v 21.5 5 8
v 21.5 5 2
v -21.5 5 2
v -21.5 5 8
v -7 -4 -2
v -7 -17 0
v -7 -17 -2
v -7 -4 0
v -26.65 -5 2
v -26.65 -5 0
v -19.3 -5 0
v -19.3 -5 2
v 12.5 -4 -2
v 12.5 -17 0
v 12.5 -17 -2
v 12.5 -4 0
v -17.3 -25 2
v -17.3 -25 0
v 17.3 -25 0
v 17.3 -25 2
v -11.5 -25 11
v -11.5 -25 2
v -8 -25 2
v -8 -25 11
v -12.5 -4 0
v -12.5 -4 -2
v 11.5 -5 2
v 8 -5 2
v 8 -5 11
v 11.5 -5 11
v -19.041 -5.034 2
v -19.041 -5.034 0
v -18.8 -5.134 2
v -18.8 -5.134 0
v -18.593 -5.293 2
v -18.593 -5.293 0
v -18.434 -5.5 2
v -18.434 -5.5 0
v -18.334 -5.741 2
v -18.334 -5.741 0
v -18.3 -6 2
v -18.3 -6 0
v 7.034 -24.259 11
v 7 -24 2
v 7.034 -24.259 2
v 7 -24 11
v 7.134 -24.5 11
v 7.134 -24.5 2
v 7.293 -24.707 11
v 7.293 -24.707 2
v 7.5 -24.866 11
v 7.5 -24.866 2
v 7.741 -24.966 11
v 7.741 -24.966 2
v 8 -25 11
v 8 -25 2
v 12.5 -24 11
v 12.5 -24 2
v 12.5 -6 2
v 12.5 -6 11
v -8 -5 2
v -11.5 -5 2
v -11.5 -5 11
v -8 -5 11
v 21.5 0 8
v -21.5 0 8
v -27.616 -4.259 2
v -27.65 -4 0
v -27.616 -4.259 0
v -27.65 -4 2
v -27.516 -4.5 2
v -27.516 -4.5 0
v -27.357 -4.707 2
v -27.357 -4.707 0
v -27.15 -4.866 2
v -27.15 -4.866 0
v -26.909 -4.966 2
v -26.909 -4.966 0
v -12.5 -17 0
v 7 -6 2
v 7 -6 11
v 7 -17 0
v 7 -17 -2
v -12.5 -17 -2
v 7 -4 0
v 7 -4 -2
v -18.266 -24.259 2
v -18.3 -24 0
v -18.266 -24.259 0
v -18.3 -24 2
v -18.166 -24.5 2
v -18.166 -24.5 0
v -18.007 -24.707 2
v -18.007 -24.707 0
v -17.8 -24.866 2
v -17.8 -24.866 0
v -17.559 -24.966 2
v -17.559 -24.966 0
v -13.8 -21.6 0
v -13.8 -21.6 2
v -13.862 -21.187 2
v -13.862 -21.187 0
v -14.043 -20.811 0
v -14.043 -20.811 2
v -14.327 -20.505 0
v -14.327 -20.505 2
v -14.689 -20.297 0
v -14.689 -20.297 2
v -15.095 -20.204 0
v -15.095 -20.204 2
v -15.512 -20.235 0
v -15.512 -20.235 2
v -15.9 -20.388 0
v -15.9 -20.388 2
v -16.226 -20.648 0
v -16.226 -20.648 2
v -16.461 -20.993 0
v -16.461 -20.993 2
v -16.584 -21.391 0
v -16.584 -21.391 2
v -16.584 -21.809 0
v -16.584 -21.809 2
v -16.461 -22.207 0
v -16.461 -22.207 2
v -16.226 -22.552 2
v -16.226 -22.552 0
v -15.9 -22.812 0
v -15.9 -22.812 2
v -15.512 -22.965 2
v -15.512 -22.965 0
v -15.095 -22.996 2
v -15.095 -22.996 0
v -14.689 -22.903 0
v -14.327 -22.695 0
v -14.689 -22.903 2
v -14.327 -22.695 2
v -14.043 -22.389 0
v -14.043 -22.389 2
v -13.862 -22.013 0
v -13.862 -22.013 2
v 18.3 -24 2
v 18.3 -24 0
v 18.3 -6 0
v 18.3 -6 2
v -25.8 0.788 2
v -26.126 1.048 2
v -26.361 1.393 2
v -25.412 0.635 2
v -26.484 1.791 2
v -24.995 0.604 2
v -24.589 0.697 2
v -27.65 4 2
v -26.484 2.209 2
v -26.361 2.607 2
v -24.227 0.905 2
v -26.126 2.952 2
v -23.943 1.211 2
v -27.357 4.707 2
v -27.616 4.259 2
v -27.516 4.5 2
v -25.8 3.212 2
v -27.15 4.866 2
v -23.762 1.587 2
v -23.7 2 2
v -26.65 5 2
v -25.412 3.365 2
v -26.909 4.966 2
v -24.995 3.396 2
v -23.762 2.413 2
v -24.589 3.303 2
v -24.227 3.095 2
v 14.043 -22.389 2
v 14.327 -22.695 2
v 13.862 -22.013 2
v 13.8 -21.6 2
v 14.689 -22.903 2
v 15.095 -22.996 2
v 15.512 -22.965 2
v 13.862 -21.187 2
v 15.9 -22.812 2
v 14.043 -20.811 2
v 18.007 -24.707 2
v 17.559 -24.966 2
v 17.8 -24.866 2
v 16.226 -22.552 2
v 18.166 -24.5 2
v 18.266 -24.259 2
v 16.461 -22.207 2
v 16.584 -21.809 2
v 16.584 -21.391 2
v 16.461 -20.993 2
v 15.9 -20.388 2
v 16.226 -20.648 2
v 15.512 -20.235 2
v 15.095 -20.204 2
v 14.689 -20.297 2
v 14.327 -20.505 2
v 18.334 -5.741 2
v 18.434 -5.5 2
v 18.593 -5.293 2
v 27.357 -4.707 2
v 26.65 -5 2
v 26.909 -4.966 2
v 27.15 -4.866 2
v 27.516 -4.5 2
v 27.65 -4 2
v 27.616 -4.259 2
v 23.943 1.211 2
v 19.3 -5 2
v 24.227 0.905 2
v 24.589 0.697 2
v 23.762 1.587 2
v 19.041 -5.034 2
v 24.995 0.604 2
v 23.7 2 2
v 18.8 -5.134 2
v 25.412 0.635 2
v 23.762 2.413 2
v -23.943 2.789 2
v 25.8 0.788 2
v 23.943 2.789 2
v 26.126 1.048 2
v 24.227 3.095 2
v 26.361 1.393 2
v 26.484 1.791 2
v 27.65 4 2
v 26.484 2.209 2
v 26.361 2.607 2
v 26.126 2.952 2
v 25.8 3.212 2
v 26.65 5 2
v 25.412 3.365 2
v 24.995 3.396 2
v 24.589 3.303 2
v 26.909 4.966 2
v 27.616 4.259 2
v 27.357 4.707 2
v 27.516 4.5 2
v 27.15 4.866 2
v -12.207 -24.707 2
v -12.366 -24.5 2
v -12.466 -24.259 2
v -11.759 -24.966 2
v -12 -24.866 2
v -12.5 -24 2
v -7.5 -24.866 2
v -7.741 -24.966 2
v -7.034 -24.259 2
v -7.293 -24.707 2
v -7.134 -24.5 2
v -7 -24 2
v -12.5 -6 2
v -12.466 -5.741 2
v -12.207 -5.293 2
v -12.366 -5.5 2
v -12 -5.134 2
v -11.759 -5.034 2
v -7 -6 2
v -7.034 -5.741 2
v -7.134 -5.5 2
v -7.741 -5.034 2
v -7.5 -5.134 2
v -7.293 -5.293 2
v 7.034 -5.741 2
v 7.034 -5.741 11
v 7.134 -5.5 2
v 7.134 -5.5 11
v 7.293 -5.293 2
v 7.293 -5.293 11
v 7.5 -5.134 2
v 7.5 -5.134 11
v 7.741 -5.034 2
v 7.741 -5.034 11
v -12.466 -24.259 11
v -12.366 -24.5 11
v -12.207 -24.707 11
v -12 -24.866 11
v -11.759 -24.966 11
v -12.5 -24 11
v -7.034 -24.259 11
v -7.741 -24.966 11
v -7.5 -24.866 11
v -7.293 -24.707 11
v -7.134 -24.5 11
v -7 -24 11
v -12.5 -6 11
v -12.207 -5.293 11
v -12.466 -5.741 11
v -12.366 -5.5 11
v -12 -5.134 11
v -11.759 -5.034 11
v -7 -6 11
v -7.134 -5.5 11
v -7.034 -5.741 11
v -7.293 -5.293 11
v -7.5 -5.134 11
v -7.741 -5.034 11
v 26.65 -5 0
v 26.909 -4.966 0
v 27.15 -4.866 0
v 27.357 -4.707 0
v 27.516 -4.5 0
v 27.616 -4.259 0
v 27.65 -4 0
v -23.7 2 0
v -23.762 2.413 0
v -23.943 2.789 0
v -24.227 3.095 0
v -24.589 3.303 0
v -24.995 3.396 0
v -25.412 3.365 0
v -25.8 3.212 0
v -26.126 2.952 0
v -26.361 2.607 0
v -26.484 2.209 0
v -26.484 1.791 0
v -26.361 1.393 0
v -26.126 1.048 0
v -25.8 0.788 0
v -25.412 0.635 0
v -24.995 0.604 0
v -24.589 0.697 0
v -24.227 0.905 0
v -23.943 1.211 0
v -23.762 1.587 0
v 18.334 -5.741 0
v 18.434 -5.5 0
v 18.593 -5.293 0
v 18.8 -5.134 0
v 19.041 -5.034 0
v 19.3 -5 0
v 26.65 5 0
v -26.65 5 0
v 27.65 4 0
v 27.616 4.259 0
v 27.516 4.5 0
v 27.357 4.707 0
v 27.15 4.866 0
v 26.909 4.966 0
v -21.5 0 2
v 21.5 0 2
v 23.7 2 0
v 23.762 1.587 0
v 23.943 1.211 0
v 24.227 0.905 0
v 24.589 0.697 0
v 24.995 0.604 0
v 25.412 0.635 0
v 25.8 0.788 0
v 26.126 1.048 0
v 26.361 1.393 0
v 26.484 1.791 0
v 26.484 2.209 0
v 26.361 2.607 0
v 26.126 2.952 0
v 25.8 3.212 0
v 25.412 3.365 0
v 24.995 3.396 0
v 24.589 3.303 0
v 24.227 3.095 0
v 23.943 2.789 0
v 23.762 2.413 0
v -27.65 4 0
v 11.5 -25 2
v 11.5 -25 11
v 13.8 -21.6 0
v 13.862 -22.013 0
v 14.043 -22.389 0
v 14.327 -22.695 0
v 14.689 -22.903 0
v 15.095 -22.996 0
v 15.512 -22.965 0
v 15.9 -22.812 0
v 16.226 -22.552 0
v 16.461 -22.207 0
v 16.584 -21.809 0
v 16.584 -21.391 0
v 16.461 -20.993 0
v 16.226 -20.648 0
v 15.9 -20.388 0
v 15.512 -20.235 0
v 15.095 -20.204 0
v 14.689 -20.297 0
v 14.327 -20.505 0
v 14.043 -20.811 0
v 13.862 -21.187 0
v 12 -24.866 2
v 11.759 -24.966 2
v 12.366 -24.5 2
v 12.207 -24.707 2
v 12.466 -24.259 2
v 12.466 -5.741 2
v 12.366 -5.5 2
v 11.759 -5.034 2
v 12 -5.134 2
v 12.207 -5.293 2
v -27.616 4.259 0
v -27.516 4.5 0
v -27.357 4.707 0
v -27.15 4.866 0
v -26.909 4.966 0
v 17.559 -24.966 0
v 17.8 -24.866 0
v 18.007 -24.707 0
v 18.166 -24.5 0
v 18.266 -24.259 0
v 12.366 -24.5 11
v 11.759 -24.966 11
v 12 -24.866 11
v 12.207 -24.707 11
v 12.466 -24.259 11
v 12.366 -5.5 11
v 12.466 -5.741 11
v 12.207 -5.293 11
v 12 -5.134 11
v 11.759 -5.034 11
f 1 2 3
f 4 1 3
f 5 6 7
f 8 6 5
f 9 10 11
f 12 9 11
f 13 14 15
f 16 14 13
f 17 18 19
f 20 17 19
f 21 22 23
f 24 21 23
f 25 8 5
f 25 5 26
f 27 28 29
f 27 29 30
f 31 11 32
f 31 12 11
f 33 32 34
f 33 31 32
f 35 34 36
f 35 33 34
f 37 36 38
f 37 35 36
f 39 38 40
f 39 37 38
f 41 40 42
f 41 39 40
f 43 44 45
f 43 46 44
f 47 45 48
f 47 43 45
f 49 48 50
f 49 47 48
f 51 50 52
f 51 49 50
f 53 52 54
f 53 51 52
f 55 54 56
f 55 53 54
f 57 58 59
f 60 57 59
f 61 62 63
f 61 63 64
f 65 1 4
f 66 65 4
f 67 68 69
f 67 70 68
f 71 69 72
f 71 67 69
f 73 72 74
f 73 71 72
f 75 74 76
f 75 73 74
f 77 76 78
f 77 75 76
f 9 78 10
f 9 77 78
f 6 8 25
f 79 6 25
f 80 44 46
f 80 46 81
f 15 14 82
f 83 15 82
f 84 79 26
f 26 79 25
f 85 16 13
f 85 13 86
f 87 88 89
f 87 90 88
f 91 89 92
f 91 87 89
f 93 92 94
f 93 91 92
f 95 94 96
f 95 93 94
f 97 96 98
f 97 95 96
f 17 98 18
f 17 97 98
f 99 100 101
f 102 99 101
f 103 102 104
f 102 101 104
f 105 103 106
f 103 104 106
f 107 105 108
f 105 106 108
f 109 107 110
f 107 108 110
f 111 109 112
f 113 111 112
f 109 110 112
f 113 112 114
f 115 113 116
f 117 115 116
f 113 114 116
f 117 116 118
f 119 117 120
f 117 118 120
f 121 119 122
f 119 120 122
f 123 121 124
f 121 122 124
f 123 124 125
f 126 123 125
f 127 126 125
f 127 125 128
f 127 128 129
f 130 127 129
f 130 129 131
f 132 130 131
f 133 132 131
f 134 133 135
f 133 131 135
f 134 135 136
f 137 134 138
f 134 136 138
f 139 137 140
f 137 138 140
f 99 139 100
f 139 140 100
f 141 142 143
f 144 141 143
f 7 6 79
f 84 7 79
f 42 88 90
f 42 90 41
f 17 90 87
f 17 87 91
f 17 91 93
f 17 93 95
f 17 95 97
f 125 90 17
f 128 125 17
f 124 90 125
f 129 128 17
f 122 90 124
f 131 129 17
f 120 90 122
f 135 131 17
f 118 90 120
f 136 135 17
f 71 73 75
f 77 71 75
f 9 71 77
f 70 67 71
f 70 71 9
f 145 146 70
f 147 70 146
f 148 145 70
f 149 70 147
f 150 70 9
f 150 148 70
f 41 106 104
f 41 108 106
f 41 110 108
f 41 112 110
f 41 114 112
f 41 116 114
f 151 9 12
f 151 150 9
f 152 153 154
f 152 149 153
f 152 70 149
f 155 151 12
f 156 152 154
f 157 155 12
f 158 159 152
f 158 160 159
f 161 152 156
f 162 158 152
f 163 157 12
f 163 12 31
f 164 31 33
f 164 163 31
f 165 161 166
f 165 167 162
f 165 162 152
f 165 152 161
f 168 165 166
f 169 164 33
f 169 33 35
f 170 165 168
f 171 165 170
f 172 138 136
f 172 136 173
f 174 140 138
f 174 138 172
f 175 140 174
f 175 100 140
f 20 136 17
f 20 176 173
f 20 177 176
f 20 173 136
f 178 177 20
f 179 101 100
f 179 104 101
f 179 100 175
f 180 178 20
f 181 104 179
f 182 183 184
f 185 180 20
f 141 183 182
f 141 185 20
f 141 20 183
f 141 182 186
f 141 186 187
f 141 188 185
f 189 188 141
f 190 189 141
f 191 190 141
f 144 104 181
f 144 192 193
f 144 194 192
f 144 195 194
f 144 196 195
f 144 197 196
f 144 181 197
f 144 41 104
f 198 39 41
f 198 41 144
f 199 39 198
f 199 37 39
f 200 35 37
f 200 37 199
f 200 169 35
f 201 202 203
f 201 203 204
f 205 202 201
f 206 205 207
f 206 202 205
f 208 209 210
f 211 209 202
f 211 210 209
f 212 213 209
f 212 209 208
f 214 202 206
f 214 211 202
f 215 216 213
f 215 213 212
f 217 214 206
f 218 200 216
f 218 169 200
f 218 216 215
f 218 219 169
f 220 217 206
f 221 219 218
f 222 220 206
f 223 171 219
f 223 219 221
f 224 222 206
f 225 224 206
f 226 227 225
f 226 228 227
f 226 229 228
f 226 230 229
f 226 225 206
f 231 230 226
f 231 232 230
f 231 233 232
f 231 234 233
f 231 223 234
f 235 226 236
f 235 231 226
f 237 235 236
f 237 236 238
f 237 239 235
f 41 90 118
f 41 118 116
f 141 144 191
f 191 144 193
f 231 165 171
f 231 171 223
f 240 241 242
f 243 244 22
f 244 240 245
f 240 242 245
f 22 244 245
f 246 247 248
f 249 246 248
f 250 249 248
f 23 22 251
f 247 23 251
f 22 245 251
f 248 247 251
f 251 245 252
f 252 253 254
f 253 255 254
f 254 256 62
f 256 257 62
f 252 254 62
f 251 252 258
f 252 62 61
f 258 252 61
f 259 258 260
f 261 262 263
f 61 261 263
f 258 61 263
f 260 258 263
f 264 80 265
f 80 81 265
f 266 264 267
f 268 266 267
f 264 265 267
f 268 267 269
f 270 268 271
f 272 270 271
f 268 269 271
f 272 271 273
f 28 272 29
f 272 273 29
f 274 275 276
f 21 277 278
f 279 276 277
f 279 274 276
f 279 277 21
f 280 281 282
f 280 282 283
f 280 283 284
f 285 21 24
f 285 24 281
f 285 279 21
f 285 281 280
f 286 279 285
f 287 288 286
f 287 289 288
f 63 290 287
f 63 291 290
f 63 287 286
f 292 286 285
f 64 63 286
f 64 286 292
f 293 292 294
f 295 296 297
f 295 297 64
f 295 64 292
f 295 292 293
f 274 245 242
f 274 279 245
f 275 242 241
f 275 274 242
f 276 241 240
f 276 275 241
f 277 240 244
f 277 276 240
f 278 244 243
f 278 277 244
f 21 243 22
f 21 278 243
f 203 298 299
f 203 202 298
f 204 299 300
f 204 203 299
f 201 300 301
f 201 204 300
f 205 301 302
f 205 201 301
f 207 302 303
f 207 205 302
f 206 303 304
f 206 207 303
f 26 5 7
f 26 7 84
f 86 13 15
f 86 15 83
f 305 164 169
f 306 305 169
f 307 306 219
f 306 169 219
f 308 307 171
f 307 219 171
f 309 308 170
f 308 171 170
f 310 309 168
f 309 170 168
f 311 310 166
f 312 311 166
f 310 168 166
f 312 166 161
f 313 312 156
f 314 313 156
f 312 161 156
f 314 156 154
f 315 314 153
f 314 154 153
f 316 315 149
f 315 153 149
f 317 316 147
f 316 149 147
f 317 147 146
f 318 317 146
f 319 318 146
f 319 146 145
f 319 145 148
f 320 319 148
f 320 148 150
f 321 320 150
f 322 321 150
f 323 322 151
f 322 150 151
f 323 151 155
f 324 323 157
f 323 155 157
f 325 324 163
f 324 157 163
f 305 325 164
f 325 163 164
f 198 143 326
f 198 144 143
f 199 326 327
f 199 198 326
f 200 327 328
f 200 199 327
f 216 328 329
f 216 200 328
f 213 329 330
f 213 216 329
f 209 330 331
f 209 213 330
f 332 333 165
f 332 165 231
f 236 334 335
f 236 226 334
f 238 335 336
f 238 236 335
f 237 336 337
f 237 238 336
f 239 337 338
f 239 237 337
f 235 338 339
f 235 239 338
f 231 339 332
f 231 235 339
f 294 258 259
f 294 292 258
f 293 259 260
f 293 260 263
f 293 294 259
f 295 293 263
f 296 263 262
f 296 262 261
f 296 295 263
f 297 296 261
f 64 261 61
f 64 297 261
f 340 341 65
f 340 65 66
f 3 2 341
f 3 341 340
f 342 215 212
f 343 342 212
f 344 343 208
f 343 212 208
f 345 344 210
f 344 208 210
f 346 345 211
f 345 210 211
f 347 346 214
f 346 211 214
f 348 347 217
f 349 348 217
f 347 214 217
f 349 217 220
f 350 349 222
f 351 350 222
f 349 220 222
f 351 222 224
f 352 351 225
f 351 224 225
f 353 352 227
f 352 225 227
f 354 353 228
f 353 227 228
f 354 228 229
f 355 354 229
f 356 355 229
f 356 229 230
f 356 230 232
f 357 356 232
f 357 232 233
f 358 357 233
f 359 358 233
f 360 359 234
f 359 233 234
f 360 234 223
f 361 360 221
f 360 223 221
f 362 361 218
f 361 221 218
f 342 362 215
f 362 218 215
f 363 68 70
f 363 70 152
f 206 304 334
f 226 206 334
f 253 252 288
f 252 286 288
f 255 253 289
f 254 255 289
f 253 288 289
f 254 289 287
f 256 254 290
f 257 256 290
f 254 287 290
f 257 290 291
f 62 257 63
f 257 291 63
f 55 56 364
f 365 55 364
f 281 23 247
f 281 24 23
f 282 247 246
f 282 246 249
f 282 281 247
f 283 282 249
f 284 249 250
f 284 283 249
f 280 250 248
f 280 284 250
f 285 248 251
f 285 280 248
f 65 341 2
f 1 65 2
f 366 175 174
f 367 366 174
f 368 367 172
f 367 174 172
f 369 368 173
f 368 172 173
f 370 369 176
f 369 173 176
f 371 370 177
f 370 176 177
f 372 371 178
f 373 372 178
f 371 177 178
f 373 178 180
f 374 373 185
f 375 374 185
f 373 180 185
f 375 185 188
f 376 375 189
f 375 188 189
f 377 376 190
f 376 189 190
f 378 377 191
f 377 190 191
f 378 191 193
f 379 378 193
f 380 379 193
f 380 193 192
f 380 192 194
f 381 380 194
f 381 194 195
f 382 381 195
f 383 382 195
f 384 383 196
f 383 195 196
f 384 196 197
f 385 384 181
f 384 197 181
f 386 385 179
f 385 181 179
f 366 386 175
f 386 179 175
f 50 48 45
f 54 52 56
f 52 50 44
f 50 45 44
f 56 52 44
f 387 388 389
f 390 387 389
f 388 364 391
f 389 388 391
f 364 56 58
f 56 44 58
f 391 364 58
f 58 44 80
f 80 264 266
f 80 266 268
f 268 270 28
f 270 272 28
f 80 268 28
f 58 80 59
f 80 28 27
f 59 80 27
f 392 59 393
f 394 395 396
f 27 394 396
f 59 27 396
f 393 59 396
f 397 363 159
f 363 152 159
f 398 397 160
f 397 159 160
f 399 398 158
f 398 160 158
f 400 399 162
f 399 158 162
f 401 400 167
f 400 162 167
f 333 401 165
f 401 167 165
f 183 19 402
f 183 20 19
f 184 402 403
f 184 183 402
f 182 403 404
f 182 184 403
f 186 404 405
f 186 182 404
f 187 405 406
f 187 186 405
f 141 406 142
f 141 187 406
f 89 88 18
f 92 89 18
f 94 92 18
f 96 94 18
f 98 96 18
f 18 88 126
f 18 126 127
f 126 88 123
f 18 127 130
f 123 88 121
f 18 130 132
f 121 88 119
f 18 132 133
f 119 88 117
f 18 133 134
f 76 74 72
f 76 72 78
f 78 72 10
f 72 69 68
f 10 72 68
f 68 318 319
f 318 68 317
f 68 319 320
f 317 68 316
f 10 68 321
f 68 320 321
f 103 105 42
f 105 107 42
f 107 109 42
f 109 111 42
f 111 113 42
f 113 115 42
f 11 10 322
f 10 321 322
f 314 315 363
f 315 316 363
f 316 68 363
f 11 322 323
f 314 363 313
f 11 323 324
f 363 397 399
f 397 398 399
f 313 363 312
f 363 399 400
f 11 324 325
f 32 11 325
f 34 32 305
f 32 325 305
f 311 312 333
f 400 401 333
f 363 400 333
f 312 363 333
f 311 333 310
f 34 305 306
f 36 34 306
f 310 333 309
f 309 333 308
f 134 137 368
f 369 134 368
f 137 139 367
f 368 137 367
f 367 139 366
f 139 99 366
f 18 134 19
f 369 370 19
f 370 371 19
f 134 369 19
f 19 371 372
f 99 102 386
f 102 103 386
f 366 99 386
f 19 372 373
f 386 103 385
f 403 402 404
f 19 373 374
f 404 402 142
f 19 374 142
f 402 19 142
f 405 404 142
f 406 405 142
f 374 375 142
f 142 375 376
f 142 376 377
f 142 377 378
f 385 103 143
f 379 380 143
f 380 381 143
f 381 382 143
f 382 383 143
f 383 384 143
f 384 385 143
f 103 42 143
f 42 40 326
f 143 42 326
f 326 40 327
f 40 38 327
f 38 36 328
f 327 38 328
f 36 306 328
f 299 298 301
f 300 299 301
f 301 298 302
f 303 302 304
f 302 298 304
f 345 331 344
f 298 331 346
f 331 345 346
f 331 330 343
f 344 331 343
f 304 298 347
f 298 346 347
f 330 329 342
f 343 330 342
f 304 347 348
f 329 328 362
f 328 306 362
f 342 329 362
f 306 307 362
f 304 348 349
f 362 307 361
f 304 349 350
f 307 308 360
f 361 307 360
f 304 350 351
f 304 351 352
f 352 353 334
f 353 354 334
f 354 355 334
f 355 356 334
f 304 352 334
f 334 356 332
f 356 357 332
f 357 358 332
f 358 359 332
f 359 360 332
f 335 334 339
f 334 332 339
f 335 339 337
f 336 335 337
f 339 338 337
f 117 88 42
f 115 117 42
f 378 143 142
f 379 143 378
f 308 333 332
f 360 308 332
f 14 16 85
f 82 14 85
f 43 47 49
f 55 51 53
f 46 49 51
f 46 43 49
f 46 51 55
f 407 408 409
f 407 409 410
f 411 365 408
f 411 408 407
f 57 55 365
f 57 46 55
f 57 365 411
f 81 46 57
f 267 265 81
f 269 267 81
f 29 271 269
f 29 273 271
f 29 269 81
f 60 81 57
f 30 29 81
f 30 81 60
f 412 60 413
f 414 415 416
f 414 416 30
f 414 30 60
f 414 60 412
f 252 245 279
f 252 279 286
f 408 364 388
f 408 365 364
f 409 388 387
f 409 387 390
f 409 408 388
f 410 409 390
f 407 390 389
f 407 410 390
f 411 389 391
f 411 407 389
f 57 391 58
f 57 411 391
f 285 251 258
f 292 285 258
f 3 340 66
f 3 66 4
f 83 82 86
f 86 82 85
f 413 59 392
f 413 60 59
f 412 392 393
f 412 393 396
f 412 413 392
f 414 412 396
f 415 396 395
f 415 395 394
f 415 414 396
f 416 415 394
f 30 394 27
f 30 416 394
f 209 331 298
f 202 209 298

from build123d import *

# Parameters (mm, degrees)
SKETCH_1_W          = 55.3
SKETCH_1_H          = 10
SKETCH_1_W_2        = 36.6
SKETCH_1_H_2        = 20
EXTRUDE_1_DEPTH     = 2
FILLET_1_R          = 1
SKETCH_2_R          = 1.4
CUT_EXTRUDE_1_DEPTH = 2
SKETCH_3_W          = 5.5
SKETCH_3_H          = 20
EXTRUDE_2_DEPTH     = 9
EXTRUDE_2_2_DEPTH   = 9
FILLET_2_R          = 1
FILLET_3_R          = 1
SKETCH_4_W          = 5.5
SKETCH_4_H          = 13
EXTRUDE_3_DEPTH     = 2
EXTRUDE_3_2_DEPTH   = 2
SKETCH_5_W          = 43
SKETCH_5_H          = 5
EXTRUDE_4_DEPTH     = 6


with BuildPart() as part:
    # 草图1 → 凸台-拉伸1 (new body)
    with BuildSketch(Plane.XY):
        Rectangle(SKETCH_1_W, SKETCH_1_H)
        with Locations((0, -15)):
            Rectangle(SKETCH_1_W_2, SKETCH_1_H_2)
    extrude(amount=EXTRUDE_1_DEPTH)

    # 圆角1
    fillet_1_edges = [part.edges().sort_by_distance(p)[0] for p in [
        (27.65, -5, 1),
        (18.3, -5, 1),
        (18.3, -25, 1),
        (-18.3, -25, 1),
        (-18.3, -5, 1),
        (-27.65, -5, 1),
        (-27.65, 5, 1),
        (27.65, 5, 1),
    ]]
    fillet(fillet_1_edges, radius=FILLET_1_R)

    # 草图2 → 切除-拉伸1 (cut)
    with BuildSketch(Plane.XY.offset(2)):
        with Locations((-25.1, 2)):
            Circle(SKETCH_2_R)
        with Locations((-15.2, -21.6)):
            Circle(SKETCH_2_R)
        with Locations(Location((15.2, -21.6, 0), (0, 0, 180))):
            Circle(SKETCH_2_R)
        with Locations(Location((25.1, 2, 0), (0, 0, 180))):
            Circle(SKETCH_2_R)
    extrude(amount=-CUT_EXTRUDE_1_DEPTH, mode=Mode.SUBTRACT)


with BuildPart() as body_2:
    # 草图3 → 凸台-拉伸2 (new body)
    with BuildSketch(Plane.XY.offset(2)):
        with Locations((-9.75, -15)):
            Rectangle(SKETCH_3_W, SKETCH_3_H)
    extrude(amount=EXTRUDE_2_DEPTH)

    # 圆角2
    fillet_2_edges = [body_2.edges().sort_by_distance(p)[0] for p in [
        (-12.5, -5, 6.5),
        (-7, -5, 6.5),
        (-7, -25, 6.5),
        (-12.5, -25, 6.5),
    ]]
    fillet(fillet_2_edges, radius=FILLET_2_R)


with BuildPart() as body_3:
    # 草图3 → Extrude 2 2 (new body)
    with BuildSketch(Plane.XY.offset(2)):
        with Locations((9.75, -15)):
            Rectangle(SKETCH_3_W, SKETCH_3_H)
    extrude(amount=EXTRUDE_2_2_DEPTH)

    # 圆角3
    fillet_3_edges = [body_3.edges().sort_by_distance(p)[0] for p in [
        (7, -25, 6.5),
        (7, -5, 6.5),
        (12.5, -5, 6.5),
        (12.5, -25, 6.5),
    ]]
    fillet(fillet_3_edges, radius=FILLET_3_R)


with BuildPart() as body_4:
    # 草图4 → 凸台-拉伸3 (new body)
    with BuildSketch(Plane(origin=(0, 0, 0), x_dir=(-1, 0, 0), z_dir=(0, 0, -1))):
        with Locations((-9.75, -10.5)):
            Rectangle(SKETCH_4_W, SKETCH_4_H)
    extrude(amount=EXTRUDE_3_DEPTH)


with BuildPart() as body_5:
    # 草图4 → Extrude 3 2 (new body)
    with BuildSketch(Plane(origin=(0, 0, 0), x_dir=(-1, 0, 0), z_dir=(0, 0, -1))):
        with Locations((9.75, -10.5)):
            Rectangle(SKETCH_4_W, SKETCH_4_H)
    extrude(amount=EXTRUDE_3_2_DEPTH)


with BuildPart() as body_6:
    # 草图5 → 凸台-拉伸4 (new body)
    with BuildSketch(Plane(origin=(0, 0, 2), x_dir=(-1, 0, 0), z_dir=(0, 0, -1))):
        with Locations((0, 2.5)):
            Rectangle(SKETCH_5_W, SKETCH_5_H)
    extrude(amount=-EXTRUDE_4_DEPTH)


solid = Compound([part.part, body_2.part, body_3.part, body_4.part, body_5.part, body_6.part])
